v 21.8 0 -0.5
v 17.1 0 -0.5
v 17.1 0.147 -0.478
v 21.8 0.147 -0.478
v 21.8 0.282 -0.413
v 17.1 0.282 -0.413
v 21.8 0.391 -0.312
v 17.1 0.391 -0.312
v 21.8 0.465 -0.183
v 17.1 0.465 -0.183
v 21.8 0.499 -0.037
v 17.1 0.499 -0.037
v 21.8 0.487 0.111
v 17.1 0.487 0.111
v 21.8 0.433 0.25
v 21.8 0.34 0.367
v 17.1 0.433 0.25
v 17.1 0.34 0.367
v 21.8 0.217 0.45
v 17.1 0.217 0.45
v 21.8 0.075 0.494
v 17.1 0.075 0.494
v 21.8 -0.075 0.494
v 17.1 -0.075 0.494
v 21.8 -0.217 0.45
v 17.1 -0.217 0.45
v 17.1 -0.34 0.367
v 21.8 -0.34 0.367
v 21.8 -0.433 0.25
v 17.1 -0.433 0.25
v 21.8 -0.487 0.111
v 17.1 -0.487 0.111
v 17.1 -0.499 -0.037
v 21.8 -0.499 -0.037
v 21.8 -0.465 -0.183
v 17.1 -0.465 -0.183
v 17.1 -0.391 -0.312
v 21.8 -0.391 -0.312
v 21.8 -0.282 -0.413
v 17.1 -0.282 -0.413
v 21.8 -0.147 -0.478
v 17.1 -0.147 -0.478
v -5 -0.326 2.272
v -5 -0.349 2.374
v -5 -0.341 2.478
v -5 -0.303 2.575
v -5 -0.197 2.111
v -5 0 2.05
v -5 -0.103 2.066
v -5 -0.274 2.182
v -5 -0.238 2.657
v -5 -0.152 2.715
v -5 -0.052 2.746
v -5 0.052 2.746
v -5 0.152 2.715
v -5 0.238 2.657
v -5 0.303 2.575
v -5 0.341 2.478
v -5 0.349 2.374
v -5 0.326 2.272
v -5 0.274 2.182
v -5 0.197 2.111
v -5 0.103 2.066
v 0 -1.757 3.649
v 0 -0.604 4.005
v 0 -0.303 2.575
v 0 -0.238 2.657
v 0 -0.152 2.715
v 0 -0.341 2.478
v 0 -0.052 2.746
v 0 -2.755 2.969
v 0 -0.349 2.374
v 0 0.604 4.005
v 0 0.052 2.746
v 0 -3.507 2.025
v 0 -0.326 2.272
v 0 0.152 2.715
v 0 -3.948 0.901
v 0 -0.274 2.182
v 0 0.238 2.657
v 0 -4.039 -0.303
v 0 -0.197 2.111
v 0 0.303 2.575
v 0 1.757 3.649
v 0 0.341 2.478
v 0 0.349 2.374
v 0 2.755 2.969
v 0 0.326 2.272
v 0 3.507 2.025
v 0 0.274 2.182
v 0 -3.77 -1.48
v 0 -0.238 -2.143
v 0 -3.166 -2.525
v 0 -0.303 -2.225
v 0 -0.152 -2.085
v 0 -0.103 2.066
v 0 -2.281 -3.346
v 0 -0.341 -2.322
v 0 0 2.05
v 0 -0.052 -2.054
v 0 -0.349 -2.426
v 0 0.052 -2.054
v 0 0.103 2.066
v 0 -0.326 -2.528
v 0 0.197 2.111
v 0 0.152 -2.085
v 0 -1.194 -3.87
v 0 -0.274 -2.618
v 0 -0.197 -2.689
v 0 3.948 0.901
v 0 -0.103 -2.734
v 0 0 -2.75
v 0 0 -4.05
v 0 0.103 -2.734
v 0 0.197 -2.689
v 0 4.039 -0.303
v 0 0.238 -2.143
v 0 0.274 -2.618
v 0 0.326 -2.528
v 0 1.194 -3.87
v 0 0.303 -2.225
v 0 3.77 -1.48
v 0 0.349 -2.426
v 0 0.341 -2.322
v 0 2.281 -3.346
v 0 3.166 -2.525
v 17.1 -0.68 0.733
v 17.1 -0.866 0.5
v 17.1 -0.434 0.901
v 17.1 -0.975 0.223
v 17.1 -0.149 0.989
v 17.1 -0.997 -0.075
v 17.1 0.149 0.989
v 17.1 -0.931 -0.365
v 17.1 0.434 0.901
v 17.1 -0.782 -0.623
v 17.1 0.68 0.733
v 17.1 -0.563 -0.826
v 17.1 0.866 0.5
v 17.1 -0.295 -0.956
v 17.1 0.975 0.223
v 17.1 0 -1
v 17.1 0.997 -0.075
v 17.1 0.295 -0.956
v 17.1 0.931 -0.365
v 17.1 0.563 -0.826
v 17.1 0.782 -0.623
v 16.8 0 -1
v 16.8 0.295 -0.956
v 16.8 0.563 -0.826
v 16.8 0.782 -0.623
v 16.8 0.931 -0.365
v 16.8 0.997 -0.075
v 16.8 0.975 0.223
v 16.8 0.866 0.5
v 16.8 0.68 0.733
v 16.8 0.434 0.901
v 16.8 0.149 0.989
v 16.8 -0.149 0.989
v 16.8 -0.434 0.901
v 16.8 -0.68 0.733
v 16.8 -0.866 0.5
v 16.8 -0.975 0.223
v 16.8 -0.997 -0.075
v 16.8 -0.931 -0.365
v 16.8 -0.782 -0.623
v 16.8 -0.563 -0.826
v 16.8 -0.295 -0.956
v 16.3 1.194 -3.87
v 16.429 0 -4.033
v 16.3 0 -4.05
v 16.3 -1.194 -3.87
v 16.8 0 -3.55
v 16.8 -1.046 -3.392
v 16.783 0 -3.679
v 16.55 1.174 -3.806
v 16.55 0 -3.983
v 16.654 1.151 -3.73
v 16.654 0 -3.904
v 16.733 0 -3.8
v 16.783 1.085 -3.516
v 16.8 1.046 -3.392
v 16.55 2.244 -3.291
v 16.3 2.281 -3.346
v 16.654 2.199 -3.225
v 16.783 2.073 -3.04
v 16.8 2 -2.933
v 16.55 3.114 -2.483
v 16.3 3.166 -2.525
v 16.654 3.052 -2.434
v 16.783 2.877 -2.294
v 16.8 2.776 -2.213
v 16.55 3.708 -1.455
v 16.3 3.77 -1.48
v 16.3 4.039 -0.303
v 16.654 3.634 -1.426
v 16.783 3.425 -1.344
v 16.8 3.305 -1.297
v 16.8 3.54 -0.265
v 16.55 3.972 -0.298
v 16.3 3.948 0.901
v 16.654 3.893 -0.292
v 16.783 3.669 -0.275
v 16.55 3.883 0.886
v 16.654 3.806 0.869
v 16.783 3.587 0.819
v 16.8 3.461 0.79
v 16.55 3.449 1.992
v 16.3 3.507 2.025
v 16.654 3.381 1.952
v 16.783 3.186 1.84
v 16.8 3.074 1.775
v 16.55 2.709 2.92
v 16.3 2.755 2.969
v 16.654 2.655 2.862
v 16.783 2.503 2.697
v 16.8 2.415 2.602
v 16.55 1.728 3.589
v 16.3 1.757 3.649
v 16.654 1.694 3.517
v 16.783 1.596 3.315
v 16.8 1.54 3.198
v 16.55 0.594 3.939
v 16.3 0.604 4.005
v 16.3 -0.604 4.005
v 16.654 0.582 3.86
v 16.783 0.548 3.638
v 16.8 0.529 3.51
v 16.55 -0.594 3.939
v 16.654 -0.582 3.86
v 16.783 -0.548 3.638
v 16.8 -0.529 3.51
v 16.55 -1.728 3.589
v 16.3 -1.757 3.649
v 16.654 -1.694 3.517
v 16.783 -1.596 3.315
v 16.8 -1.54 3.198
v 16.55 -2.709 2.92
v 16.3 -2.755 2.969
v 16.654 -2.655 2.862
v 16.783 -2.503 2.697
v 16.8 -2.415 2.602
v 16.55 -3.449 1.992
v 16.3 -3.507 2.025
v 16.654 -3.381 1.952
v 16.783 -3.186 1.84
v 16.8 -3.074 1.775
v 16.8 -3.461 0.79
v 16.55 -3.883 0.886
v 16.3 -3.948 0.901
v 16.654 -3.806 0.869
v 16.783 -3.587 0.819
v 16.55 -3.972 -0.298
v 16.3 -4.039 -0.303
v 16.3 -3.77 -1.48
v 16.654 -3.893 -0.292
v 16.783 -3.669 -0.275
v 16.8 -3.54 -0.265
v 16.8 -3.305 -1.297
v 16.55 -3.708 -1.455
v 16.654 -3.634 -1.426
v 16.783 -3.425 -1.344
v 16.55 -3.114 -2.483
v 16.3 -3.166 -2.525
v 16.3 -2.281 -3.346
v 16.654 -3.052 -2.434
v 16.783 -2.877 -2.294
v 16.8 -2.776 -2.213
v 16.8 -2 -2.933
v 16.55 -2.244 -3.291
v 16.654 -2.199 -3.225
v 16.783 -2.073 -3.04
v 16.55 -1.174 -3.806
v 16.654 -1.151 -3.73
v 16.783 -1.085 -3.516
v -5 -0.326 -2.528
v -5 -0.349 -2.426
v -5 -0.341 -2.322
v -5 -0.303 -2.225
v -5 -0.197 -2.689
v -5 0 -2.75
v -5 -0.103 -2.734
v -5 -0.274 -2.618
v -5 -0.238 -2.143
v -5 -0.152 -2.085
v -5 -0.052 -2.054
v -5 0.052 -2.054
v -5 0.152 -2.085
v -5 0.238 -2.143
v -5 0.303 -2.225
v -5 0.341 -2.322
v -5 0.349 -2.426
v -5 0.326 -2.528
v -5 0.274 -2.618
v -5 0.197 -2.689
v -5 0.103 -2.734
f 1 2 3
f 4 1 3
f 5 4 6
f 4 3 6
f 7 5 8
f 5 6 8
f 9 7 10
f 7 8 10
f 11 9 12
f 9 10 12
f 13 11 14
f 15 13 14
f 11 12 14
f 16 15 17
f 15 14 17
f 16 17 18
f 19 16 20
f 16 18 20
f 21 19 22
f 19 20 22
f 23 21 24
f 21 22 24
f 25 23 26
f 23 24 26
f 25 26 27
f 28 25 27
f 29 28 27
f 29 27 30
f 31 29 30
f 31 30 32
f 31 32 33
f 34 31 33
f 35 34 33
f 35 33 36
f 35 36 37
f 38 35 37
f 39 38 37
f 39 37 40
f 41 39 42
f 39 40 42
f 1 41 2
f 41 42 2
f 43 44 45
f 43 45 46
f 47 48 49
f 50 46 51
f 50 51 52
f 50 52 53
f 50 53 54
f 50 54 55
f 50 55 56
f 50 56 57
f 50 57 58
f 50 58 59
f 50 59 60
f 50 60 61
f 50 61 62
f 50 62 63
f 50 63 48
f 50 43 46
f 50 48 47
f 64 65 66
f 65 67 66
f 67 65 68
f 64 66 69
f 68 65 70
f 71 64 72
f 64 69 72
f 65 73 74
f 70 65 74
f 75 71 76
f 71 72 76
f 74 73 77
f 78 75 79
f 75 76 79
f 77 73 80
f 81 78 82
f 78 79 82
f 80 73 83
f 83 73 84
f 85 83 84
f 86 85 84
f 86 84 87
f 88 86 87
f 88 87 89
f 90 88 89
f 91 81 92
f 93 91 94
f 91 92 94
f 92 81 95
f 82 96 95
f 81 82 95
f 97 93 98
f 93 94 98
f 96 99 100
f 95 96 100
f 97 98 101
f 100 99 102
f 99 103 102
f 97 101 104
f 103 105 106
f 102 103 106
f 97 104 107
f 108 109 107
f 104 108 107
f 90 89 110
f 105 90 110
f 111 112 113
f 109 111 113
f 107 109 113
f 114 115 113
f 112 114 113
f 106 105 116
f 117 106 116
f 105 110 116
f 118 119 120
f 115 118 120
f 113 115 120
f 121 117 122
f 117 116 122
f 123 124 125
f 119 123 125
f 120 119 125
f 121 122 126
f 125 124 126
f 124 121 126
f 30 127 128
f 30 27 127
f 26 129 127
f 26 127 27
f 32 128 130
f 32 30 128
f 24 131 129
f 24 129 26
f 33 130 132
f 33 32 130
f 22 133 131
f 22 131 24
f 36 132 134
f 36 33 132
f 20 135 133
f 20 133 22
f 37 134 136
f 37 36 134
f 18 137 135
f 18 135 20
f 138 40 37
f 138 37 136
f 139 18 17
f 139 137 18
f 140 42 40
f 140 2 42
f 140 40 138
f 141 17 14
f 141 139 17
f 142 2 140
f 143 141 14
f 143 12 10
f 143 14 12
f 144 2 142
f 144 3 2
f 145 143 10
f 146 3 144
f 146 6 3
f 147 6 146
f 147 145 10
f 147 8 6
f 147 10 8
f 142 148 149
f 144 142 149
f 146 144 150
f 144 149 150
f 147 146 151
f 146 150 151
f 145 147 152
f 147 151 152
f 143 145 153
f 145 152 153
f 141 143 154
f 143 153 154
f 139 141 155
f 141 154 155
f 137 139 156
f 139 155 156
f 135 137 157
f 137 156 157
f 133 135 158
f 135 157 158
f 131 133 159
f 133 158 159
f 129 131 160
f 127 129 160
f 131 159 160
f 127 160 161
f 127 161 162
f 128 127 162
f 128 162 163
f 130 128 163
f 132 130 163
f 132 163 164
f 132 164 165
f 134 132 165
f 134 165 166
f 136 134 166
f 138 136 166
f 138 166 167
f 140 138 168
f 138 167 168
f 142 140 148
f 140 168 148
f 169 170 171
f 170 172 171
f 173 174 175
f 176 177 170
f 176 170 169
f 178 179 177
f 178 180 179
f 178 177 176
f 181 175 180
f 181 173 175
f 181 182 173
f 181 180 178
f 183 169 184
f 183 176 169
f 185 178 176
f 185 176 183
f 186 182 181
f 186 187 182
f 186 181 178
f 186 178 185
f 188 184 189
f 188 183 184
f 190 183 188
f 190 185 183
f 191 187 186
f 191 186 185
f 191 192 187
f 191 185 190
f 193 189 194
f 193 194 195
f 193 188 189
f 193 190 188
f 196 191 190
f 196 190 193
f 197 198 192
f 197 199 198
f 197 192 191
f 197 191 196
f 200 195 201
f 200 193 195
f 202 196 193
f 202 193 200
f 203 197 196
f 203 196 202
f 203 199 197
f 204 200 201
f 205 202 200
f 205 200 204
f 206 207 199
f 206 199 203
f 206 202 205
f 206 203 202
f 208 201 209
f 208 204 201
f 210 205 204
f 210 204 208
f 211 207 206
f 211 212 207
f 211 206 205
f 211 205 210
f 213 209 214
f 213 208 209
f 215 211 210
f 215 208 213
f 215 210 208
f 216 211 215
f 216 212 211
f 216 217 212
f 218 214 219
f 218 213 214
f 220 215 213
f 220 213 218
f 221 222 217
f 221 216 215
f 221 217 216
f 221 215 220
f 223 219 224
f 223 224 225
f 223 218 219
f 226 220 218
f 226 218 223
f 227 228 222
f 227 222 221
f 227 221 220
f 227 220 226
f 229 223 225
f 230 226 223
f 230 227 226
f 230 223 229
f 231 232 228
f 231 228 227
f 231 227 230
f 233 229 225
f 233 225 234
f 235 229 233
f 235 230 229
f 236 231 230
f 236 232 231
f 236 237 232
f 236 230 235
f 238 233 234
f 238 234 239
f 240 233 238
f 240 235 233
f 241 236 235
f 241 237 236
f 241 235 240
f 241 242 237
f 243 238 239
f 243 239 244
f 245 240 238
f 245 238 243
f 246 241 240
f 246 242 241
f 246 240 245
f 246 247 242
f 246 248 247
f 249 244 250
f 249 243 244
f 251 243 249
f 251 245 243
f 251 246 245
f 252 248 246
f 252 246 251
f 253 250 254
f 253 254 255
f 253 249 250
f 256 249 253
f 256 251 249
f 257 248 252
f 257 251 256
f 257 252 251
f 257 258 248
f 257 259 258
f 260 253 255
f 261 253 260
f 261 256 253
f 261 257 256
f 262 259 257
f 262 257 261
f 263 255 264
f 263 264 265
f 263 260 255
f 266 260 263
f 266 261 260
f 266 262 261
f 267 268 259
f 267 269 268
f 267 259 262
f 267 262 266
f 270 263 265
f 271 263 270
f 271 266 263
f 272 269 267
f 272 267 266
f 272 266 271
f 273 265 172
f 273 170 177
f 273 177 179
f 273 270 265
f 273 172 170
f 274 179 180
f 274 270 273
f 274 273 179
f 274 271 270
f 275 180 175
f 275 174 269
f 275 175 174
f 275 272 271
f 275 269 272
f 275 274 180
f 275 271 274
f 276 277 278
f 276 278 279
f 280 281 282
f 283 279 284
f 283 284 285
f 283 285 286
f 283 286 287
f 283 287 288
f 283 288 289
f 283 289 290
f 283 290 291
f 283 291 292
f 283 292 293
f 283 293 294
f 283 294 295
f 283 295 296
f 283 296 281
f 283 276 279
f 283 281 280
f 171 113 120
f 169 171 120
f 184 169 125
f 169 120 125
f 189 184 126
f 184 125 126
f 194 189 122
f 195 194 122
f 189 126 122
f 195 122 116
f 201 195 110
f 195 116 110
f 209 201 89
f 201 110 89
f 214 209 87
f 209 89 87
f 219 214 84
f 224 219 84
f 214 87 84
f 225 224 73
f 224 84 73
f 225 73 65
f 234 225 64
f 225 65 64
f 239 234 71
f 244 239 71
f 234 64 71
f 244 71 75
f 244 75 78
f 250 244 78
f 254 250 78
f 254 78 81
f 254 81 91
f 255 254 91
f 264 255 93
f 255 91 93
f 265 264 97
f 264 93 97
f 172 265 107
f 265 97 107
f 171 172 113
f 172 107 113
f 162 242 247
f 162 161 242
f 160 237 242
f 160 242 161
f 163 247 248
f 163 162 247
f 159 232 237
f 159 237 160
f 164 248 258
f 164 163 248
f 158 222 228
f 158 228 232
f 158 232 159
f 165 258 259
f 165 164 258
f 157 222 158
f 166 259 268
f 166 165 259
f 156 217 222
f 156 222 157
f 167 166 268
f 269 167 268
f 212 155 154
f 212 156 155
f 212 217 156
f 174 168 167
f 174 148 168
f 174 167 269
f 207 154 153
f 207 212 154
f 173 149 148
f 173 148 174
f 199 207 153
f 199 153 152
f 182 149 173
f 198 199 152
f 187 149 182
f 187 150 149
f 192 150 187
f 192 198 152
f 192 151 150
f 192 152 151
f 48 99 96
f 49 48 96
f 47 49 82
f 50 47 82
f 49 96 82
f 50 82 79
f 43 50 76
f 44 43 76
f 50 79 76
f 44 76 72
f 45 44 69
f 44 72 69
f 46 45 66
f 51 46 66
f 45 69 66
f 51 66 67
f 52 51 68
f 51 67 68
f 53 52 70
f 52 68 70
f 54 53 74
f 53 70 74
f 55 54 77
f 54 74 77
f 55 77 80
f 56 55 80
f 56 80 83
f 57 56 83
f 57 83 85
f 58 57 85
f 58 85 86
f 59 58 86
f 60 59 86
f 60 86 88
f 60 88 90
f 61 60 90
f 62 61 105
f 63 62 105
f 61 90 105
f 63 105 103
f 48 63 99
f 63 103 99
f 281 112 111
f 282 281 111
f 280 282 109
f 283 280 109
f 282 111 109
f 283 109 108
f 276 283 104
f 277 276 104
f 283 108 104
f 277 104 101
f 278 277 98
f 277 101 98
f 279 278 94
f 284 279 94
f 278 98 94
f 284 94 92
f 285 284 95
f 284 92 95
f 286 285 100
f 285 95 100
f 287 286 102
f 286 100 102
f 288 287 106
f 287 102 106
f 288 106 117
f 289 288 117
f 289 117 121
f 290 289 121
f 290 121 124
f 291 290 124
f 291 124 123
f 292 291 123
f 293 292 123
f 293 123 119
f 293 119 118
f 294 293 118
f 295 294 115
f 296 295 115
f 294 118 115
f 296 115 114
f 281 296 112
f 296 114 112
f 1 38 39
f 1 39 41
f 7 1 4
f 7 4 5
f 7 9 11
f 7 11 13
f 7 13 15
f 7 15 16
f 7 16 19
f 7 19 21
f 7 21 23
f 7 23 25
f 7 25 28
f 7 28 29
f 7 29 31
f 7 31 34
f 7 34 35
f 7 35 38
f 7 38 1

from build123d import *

# Parameters (mm, degrees)
SKETCH1_R           = 4.05
BOSS_EXTRUDE1_DEPTH = 16.8
SKETCH2_R           = 1
BOSS_EXTRUDE2_DEPTH = 0.3
SKETCH3_R           = 0.5
BOSS_EXTRUDE3_DEPTH = 4.7
SKETCH4_R           = 0.35
BOSS_EXTRUDE4_DEPTH = 5
FILLET1_R           = 0.5


with BuildPart() as part:
    # Sketch1 → Boss-Extrude1 (new body)
    with BuildSketch(Plane(origin=(0, 0, 0), x_dir=(0, 0, -1), z_dir=(1, 0, 0))):
        Circle(SKETCH1_R)
    extrude(amount=BOSS_EXTRUDE1_DEPTH)

    # Sketch2 → Boss-Extrude2 (add)
    with BuildSketch(Plane(origin=(16.8, 0, 0), x_dir=(0, 0, -1), z_dir=(1, 0, 0))):
        Circle(SKETCH2_R)
    extrude(amount=BOSS_EXTRUDE2_DEPTH)

    # Sketch3 → Boss-Extrude3 (add)
    with BuildSketch(Plane(origin=(17.1, 0, 0), x_dir=(0, 0, -1), z_dir=(1, 0, 0))):
        Circle(SKETCH3_R)
    extrude(amount=BOSS_EXTRUDE3_DEPTH)

    # Sketch4 → Boss-Extrude4 (add)
    with BuildSketch(Plane.ZY):
        with Locations(Location((2.4, 0, 0), (0, 0, 180))):
            Circle(SKETCH4_R)
        with Locations(Location((-2.4, 0, 0), (0, 0, 180))):
            Circle(SKETCH4_R)
    extrude(amount=BOSS_EXTRUDE4_DEPTH)

    # Fillet1
    fillet1_edges = [part.edges().sort_by_distance(p)[0] for p in [
        (16.8, 0, 4.05),
    ]]
    fillet(fillet1_edges, radius=FILLET1_R)


solid = part.part
